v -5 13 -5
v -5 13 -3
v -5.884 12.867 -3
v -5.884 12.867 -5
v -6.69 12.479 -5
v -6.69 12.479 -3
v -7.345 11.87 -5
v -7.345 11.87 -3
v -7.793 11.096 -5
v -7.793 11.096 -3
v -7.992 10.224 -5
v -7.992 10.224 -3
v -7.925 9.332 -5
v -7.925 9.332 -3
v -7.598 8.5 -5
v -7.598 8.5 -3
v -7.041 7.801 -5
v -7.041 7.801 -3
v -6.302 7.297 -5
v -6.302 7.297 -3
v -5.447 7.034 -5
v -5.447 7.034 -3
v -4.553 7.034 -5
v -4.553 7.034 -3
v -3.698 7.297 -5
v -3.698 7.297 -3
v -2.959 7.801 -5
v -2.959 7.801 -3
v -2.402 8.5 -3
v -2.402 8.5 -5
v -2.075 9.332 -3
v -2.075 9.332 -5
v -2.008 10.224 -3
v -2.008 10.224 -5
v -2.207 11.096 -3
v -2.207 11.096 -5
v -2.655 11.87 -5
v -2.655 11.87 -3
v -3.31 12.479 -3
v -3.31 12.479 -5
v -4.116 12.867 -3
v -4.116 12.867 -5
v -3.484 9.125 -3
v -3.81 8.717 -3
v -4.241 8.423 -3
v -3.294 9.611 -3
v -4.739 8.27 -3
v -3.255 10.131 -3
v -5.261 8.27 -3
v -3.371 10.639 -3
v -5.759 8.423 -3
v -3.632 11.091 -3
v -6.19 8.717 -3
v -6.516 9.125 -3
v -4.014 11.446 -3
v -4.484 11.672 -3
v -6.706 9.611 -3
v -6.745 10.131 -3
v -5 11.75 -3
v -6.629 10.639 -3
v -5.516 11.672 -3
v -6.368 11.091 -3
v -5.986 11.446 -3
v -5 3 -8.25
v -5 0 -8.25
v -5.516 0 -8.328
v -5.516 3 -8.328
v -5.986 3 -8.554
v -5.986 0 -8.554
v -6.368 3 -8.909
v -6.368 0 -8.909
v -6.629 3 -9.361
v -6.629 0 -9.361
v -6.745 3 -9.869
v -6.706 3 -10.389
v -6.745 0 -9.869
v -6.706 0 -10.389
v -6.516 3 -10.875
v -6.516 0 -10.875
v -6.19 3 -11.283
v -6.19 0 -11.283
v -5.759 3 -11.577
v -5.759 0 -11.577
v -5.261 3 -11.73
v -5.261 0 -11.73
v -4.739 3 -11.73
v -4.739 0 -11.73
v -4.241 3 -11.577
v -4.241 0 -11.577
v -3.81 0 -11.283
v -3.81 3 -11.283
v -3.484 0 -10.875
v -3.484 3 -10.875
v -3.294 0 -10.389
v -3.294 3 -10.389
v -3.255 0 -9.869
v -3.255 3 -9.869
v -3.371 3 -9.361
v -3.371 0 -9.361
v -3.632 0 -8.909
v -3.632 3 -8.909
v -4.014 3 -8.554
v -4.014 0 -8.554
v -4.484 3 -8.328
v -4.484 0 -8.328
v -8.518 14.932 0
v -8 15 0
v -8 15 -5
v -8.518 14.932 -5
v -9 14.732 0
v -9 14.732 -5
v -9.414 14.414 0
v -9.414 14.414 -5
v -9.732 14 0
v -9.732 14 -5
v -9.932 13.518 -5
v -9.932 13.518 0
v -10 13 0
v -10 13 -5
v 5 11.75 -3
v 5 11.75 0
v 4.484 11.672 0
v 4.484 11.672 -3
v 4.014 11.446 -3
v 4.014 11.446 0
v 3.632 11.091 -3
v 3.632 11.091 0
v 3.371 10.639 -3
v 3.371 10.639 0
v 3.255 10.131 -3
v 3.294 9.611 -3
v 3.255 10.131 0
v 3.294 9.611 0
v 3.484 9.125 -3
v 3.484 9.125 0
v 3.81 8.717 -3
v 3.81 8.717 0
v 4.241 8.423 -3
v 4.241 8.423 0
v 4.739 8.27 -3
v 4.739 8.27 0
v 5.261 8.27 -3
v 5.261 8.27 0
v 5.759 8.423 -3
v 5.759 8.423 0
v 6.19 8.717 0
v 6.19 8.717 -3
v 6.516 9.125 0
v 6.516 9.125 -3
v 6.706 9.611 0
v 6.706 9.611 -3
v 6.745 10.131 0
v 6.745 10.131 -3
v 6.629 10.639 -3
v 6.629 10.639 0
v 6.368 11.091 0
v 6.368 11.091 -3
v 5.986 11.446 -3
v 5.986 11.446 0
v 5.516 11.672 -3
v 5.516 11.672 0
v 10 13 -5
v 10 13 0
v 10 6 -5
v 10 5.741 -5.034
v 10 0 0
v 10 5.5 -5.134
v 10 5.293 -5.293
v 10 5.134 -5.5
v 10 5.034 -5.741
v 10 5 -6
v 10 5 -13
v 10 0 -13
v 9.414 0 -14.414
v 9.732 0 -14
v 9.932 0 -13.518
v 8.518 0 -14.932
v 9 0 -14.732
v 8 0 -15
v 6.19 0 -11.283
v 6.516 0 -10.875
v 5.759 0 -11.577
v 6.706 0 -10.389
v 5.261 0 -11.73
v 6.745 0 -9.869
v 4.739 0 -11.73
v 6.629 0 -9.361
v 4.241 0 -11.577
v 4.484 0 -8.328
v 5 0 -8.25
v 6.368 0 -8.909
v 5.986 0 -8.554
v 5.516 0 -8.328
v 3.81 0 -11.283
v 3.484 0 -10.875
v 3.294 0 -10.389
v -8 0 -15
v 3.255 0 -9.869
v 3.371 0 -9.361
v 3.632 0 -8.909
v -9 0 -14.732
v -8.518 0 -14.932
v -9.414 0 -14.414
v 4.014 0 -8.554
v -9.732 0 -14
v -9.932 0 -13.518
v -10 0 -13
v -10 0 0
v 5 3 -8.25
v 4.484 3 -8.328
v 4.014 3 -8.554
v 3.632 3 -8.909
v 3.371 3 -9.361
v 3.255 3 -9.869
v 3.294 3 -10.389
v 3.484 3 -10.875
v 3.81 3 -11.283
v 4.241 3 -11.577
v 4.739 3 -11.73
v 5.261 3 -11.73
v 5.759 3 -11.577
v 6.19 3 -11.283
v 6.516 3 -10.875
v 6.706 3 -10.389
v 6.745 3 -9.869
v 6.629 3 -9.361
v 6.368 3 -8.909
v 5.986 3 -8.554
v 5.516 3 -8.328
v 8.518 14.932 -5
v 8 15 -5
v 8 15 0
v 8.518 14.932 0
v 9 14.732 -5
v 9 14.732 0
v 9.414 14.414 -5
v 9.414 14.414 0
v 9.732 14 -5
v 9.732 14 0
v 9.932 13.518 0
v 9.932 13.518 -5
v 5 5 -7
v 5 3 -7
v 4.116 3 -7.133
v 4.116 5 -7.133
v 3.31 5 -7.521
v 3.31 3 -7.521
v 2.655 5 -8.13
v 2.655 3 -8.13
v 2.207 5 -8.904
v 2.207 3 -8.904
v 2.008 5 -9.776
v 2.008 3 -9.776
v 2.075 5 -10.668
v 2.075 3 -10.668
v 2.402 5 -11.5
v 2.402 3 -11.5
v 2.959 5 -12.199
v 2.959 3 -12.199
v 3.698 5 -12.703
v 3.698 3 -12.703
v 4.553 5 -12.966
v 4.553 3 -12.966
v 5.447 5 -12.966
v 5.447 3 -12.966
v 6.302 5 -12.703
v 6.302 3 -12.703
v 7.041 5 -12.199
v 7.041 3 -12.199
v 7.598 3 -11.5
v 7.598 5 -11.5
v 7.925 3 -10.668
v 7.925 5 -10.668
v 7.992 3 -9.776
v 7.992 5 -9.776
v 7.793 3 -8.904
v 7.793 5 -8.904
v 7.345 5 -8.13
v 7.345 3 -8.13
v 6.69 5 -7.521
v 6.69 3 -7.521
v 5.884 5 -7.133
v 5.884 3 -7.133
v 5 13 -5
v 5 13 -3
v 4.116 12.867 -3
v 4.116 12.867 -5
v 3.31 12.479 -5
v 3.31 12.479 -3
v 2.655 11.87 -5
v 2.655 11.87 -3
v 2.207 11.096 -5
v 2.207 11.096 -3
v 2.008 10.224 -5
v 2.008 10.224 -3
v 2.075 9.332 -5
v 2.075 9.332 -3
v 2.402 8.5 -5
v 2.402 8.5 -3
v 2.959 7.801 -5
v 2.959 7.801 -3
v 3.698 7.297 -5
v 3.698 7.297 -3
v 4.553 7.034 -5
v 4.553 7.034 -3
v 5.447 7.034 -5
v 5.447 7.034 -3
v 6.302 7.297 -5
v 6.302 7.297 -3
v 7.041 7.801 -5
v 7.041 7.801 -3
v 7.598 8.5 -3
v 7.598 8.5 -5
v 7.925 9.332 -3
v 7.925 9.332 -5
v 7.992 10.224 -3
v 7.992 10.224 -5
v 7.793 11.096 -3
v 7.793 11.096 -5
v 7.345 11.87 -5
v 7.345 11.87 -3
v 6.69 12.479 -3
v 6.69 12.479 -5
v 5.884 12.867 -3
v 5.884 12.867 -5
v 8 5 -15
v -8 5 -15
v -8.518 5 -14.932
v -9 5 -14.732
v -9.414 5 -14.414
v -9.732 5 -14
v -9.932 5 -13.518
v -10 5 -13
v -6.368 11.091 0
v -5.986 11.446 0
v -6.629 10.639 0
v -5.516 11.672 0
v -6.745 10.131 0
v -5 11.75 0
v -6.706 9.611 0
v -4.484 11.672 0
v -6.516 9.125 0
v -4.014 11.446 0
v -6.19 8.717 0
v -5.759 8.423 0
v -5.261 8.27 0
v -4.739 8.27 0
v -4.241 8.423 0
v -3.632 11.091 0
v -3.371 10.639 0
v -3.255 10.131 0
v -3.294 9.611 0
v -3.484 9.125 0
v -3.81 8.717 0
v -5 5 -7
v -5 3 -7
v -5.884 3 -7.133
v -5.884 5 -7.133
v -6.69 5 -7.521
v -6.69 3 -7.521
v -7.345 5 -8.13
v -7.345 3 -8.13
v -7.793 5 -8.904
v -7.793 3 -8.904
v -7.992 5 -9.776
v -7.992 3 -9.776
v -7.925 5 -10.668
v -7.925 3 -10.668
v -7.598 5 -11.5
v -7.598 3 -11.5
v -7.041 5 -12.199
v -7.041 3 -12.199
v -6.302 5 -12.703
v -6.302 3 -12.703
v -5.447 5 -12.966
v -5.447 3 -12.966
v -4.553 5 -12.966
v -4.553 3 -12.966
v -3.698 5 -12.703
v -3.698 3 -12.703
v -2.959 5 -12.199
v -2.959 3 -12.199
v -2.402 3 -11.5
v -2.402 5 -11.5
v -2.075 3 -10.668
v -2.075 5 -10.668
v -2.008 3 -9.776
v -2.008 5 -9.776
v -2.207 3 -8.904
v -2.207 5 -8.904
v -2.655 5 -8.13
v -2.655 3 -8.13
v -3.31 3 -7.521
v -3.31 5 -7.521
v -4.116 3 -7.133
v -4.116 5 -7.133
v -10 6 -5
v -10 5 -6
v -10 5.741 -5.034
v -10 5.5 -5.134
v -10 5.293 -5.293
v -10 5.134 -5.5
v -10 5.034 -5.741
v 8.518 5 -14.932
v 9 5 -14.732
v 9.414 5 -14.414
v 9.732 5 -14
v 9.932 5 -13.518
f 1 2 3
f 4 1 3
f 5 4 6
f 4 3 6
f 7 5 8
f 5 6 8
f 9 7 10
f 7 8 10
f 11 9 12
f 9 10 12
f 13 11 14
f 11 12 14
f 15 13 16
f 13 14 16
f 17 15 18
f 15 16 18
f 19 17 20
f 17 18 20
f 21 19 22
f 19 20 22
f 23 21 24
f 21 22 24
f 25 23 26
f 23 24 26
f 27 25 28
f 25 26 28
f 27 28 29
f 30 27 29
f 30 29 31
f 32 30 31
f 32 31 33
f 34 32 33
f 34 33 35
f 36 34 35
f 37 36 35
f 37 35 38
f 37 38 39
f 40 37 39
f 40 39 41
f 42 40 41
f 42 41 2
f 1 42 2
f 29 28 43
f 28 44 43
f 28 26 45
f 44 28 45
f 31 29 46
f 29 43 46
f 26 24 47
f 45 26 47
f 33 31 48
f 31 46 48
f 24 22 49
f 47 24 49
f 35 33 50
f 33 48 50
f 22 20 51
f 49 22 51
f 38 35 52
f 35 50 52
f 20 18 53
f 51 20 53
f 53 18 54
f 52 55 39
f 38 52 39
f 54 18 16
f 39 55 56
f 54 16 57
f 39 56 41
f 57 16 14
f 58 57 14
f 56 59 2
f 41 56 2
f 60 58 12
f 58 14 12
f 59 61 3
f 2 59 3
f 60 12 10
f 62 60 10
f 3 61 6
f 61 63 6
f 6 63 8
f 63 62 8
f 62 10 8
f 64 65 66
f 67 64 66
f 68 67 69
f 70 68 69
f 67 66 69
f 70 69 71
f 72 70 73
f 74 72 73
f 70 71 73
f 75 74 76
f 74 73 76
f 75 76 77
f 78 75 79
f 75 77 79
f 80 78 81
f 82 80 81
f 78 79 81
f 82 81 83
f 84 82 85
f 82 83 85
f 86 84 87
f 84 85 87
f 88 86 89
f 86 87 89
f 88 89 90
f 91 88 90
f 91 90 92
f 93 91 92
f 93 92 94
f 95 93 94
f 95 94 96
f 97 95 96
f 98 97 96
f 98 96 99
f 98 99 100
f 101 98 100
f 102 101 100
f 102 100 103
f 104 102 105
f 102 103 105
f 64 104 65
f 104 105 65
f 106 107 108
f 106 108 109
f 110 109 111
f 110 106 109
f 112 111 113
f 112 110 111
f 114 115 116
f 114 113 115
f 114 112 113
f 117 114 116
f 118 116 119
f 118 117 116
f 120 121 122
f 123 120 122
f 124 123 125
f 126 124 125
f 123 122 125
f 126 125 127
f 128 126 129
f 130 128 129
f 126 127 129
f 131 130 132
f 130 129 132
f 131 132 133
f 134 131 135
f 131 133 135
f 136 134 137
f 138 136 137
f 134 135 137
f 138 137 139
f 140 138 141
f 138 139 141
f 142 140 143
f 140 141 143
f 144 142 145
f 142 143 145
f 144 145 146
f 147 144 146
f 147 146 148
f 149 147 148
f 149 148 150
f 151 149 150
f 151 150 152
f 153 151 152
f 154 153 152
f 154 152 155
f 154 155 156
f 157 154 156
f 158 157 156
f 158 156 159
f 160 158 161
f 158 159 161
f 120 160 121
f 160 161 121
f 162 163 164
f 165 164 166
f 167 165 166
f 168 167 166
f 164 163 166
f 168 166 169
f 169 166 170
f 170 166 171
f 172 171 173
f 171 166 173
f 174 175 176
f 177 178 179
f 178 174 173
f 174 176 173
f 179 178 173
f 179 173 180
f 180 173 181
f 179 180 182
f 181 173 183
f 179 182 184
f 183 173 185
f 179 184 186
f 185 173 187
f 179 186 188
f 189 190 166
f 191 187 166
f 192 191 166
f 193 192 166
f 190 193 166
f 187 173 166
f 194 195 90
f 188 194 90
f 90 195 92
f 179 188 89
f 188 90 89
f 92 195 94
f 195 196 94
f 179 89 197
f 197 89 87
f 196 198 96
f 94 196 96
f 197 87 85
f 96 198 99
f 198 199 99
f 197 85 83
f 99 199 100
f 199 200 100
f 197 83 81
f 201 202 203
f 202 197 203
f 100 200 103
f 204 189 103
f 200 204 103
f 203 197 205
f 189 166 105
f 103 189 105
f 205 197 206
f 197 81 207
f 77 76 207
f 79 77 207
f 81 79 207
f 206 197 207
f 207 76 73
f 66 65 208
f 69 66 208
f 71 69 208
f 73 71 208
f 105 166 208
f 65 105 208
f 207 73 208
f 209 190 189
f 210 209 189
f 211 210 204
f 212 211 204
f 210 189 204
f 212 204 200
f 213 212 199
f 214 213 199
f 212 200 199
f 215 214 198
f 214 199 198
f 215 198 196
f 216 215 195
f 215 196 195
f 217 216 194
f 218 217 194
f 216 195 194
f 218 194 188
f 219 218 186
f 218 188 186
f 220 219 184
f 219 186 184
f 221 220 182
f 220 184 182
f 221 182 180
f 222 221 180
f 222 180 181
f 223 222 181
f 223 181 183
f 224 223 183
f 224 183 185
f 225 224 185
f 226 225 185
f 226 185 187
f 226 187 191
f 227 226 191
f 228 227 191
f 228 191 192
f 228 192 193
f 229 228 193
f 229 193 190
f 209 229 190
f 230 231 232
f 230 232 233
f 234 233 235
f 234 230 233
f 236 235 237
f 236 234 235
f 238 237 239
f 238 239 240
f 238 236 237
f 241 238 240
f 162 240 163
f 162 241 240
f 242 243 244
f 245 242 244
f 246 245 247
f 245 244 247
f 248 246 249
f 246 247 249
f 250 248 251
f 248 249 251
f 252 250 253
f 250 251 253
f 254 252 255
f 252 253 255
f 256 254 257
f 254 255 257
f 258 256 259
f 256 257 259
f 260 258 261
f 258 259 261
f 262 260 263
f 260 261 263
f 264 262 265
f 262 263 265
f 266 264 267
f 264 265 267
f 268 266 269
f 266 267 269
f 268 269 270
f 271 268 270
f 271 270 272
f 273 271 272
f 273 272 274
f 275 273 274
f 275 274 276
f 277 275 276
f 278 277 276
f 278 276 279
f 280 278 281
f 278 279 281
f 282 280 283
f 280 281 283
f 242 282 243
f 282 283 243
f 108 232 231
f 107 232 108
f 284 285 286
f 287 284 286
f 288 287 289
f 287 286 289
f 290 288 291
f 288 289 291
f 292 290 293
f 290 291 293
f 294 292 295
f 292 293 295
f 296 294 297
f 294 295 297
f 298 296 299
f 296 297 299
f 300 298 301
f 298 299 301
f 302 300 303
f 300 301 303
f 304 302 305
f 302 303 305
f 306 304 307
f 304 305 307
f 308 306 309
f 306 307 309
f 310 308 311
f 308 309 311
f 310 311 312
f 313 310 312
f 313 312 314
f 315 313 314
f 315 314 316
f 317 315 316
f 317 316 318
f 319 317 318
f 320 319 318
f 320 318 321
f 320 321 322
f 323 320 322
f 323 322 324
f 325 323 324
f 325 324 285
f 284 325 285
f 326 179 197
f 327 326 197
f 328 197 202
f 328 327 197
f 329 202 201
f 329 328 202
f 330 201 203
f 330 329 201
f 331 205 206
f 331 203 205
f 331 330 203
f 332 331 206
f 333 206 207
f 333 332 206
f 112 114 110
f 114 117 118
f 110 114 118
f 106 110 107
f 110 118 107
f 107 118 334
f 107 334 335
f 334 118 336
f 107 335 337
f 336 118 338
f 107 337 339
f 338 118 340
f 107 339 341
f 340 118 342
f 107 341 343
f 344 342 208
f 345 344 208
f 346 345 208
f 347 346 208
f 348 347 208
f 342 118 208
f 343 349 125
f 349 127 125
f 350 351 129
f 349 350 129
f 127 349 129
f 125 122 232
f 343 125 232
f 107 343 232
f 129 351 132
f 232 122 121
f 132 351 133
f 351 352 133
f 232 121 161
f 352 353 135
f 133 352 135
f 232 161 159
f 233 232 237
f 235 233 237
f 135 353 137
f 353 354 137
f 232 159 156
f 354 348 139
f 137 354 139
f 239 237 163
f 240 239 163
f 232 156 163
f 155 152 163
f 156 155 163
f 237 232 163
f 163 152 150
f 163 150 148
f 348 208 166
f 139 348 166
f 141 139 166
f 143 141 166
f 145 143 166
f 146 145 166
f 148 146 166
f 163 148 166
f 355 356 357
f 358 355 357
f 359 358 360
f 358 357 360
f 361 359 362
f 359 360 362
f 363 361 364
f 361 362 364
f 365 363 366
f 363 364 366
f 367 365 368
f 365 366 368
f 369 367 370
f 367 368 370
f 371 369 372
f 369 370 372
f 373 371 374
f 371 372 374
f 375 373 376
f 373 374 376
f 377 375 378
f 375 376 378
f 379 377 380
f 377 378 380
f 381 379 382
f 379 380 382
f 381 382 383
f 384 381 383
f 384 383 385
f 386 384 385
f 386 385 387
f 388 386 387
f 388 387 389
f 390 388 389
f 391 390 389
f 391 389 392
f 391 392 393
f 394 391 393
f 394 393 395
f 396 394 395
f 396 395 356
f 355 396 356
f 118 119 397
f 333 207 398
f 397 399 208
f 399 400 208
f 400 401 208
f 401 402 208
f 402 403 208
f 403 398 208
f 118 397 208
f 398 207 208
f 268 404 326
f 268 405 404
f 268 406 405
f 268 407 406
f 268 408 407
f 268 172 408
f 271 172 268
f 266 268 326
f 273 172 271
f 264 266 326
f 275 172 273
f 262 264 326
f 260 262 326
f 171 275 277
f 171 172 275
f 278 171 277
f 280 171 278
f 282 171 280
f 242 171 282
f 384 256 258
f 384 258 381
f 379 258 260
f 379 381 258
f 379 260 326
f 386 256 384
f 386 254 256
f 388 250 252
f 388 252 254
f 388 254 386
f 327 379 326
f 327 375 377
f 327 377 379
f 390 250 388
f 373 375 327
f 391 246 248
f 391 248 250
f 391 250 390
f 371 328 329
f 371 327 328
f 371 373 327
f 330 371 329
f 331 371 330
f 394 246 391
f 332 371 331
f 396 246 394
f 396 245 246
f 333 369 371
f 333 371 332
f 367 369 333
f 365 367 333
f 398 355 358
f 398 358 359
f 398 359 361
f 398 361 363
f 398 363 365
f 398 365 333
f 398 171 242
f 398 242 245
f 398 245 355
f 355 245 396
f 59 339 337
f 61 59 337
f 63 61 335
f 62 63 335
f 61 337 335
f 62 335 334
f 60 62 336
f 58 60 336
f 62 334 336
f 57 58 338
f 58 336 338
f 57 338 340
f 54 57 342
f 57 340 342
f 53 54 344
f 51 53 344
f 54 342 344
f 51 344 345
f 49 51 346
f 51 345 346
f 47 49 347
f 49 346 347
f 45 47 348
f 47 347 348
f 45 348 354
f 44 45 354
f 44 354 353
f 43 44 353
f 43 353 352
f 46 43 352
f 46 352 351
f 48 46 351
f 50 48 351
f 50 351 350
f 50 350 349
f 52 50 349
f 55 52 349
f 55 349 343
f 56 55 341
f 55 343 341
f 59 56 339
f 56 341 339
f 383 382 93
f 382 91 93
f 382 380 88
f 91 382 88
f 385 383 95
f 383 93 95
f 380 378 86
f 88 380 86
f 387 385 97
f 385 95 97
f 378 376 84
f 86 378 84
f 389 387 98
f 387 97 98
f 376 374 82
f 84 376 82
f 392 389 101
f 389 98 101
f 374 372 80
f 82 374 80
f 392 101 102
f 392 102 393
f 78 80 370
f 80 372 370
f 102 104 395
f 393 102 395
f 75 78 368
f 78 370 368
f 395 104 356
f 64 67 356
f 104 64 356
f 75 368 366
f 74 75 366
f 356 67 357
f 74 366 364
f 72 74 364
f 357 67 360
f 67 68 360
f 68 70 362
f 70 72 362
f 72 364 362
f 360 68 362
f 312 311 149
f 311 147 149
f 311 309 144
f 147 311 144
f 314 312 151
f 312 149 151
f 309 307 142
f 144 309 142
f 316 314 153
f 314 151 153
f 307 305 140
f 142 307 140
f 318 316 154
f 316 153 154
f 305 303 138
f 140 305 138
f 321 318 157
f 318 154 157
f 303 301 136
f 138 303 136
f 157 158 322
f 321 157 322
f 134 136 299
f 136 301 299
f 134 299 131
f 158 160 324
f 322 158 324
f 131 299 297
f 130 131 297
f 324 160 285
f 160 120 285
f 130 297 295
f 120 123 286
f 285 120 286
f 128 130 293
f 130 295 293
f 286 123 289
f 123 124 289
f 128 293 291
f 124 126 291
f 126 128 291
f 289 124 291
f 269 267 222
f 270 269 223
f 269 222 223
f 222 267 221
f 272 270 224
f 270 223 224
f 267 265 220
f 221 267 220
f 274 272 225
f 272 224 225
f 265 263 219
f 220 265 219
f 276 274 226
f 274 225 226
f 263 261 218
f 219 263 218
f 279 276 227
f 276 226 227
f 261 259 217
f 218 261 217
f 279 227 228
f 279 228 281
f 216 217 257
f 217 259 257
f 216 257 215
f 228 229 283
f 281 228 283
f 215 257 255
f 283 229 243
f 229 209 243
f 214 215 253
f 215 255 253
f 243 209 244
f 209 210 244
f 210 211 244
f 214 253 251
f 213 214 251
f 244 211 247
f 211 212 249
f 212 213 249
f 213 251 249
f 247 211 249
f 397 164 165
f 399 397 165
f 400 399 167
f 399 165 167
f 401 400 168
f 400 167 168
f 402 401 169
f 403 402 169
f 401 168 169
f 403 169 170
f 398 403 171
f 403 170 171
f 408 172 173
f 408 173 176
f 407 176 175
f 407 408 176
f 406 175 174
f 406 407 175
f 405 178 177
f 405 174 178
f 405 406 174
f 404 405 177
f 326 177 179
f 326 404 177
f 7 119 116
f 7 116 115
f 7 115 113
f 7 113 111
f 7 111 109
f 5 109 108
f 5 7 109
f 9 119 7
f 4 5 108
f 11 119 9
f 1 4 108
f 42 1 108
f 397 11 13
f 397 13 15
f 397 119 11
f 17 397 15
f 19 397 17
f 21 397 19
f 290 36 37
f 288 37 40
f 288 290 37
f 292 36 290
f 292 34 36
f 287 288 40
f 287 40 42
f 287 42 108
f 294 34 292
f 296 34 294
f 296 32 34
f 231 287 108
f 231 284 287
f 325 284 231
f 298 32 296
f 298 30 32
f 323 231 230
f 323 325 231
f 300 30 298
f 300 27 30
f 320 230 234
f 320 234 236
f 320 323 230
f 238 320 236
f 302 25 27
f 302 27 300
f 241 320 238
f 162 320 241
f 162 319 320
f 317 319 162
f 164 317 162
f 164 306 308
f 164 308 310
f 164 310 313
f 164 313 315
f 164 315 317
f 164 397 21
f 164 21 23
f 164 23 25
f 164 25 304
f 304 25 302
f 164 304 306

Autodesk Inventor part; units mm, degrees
ref_plane "YZ Plane" through (0, 0, 0) normal (1, 0, 0) x (0, 1, 0)
ref_plane "XZ Plane" through (0, 0, 0) normal (0, 1, 0) x (-1, 0, 0)
ref_plane "XY Plane" through (0, 0, 0) normal (0, 0, 1) x (1, 0, 0)
sketch "Sketch1" plane through (0, 0, 0) normal (0, 1, 0) x (-1, 0, 0)
  line L0 (10, 0) -> (-10, 0)
  line L1 (10, -5) -> (-10, -5)
  line L2 (-10, 0) -> (-10, -15)
  line L3 (-10, -15) -> (10, -15)
  line L4 (10, -15) -> (10, 0)
  point P0 (0, 0)
  dimension "d15" = 15
  dimension "d16" = 20
extrude "Extrusion1" add sketch "Sketch1" along normal blind 15 contours L4 L1 L2 L0
extrude "Extrusion2" add sketch "Sketch1" along normal blind 5 contours L4 L3 L2 L1
sketch "Sketch2" plane through (0, 5, 0) normal (0, 1, 0) x (1, 0, 0)
  line L0 (-10, 15) -> (-10, 0) projected
  line L1 (-10, 15) -> (-5, 15)
  line L2 (10, 15) -> (-10, 15) projected
  line L3 (-5, 15) -> (-5, 10)
  line L4 (10, 15) -> (5, 15)
  line L5 (5, 15) -> (5, 10)
  point P0 (0, 0)
  dimension "d21" = 5
  dimension "d22" = 5
  dimension "d23" = 5
  dimension "d24" = 5
  dimension "d60" = 10
hole "Hole1" at (-5, 5, -10) direction (0, -1, 0) diameter 3.5 end through all counterbore diameter 6 counterbore depth 2
hole "Hole2" at (5, 5, -10) direction (0, -1, 0) diameter 3.5 end through all counterbore diameter 6 counterbore depth 2
sketch "Sketch3" plane through (10, 15, -5) normal (0, 0, -1) x (-1, 0, 0)
  line L0 (20, -10) -> (20, 0) projected
  line L1 (20, 0) -> (15, 0)
  line L2 (0, 0) -> (20, 0) projected
  line L3 (15, 0) -> (15, -5)
  line L4 (0, -10) -> (0, 0) projected
  line L5 (0, 0) -> (5, 0)
  line L6 (5, 0) -> (5, -5)
  point P0 (10, -15)
  dimension "d39" = 5
  dimension "d40" = 5
  dimension "d41" = 5
  dimension "d42" = 5
hole "Hole3" at (-5, 10, -5) direction (0, 0, 1) diameter 3.5 end through all counterbore diameter 6 counterbore depth 2
hole "Hole4" at (5, 10, -5) direction (0, 0, 1) diameter 3.5 end through all counterbore diameter 6 counterbore depth 2
fillet "Fillet2" radius 2 4 edges at (-10, 2.5, -15) (10, 2.5, -15) (10, 15, -2.5) (-10, 15, -2.5)
fillet "Fillet2" radius 1 1 edges at (0, 5, -5)
properties part number "Brackets RC mounting board"
